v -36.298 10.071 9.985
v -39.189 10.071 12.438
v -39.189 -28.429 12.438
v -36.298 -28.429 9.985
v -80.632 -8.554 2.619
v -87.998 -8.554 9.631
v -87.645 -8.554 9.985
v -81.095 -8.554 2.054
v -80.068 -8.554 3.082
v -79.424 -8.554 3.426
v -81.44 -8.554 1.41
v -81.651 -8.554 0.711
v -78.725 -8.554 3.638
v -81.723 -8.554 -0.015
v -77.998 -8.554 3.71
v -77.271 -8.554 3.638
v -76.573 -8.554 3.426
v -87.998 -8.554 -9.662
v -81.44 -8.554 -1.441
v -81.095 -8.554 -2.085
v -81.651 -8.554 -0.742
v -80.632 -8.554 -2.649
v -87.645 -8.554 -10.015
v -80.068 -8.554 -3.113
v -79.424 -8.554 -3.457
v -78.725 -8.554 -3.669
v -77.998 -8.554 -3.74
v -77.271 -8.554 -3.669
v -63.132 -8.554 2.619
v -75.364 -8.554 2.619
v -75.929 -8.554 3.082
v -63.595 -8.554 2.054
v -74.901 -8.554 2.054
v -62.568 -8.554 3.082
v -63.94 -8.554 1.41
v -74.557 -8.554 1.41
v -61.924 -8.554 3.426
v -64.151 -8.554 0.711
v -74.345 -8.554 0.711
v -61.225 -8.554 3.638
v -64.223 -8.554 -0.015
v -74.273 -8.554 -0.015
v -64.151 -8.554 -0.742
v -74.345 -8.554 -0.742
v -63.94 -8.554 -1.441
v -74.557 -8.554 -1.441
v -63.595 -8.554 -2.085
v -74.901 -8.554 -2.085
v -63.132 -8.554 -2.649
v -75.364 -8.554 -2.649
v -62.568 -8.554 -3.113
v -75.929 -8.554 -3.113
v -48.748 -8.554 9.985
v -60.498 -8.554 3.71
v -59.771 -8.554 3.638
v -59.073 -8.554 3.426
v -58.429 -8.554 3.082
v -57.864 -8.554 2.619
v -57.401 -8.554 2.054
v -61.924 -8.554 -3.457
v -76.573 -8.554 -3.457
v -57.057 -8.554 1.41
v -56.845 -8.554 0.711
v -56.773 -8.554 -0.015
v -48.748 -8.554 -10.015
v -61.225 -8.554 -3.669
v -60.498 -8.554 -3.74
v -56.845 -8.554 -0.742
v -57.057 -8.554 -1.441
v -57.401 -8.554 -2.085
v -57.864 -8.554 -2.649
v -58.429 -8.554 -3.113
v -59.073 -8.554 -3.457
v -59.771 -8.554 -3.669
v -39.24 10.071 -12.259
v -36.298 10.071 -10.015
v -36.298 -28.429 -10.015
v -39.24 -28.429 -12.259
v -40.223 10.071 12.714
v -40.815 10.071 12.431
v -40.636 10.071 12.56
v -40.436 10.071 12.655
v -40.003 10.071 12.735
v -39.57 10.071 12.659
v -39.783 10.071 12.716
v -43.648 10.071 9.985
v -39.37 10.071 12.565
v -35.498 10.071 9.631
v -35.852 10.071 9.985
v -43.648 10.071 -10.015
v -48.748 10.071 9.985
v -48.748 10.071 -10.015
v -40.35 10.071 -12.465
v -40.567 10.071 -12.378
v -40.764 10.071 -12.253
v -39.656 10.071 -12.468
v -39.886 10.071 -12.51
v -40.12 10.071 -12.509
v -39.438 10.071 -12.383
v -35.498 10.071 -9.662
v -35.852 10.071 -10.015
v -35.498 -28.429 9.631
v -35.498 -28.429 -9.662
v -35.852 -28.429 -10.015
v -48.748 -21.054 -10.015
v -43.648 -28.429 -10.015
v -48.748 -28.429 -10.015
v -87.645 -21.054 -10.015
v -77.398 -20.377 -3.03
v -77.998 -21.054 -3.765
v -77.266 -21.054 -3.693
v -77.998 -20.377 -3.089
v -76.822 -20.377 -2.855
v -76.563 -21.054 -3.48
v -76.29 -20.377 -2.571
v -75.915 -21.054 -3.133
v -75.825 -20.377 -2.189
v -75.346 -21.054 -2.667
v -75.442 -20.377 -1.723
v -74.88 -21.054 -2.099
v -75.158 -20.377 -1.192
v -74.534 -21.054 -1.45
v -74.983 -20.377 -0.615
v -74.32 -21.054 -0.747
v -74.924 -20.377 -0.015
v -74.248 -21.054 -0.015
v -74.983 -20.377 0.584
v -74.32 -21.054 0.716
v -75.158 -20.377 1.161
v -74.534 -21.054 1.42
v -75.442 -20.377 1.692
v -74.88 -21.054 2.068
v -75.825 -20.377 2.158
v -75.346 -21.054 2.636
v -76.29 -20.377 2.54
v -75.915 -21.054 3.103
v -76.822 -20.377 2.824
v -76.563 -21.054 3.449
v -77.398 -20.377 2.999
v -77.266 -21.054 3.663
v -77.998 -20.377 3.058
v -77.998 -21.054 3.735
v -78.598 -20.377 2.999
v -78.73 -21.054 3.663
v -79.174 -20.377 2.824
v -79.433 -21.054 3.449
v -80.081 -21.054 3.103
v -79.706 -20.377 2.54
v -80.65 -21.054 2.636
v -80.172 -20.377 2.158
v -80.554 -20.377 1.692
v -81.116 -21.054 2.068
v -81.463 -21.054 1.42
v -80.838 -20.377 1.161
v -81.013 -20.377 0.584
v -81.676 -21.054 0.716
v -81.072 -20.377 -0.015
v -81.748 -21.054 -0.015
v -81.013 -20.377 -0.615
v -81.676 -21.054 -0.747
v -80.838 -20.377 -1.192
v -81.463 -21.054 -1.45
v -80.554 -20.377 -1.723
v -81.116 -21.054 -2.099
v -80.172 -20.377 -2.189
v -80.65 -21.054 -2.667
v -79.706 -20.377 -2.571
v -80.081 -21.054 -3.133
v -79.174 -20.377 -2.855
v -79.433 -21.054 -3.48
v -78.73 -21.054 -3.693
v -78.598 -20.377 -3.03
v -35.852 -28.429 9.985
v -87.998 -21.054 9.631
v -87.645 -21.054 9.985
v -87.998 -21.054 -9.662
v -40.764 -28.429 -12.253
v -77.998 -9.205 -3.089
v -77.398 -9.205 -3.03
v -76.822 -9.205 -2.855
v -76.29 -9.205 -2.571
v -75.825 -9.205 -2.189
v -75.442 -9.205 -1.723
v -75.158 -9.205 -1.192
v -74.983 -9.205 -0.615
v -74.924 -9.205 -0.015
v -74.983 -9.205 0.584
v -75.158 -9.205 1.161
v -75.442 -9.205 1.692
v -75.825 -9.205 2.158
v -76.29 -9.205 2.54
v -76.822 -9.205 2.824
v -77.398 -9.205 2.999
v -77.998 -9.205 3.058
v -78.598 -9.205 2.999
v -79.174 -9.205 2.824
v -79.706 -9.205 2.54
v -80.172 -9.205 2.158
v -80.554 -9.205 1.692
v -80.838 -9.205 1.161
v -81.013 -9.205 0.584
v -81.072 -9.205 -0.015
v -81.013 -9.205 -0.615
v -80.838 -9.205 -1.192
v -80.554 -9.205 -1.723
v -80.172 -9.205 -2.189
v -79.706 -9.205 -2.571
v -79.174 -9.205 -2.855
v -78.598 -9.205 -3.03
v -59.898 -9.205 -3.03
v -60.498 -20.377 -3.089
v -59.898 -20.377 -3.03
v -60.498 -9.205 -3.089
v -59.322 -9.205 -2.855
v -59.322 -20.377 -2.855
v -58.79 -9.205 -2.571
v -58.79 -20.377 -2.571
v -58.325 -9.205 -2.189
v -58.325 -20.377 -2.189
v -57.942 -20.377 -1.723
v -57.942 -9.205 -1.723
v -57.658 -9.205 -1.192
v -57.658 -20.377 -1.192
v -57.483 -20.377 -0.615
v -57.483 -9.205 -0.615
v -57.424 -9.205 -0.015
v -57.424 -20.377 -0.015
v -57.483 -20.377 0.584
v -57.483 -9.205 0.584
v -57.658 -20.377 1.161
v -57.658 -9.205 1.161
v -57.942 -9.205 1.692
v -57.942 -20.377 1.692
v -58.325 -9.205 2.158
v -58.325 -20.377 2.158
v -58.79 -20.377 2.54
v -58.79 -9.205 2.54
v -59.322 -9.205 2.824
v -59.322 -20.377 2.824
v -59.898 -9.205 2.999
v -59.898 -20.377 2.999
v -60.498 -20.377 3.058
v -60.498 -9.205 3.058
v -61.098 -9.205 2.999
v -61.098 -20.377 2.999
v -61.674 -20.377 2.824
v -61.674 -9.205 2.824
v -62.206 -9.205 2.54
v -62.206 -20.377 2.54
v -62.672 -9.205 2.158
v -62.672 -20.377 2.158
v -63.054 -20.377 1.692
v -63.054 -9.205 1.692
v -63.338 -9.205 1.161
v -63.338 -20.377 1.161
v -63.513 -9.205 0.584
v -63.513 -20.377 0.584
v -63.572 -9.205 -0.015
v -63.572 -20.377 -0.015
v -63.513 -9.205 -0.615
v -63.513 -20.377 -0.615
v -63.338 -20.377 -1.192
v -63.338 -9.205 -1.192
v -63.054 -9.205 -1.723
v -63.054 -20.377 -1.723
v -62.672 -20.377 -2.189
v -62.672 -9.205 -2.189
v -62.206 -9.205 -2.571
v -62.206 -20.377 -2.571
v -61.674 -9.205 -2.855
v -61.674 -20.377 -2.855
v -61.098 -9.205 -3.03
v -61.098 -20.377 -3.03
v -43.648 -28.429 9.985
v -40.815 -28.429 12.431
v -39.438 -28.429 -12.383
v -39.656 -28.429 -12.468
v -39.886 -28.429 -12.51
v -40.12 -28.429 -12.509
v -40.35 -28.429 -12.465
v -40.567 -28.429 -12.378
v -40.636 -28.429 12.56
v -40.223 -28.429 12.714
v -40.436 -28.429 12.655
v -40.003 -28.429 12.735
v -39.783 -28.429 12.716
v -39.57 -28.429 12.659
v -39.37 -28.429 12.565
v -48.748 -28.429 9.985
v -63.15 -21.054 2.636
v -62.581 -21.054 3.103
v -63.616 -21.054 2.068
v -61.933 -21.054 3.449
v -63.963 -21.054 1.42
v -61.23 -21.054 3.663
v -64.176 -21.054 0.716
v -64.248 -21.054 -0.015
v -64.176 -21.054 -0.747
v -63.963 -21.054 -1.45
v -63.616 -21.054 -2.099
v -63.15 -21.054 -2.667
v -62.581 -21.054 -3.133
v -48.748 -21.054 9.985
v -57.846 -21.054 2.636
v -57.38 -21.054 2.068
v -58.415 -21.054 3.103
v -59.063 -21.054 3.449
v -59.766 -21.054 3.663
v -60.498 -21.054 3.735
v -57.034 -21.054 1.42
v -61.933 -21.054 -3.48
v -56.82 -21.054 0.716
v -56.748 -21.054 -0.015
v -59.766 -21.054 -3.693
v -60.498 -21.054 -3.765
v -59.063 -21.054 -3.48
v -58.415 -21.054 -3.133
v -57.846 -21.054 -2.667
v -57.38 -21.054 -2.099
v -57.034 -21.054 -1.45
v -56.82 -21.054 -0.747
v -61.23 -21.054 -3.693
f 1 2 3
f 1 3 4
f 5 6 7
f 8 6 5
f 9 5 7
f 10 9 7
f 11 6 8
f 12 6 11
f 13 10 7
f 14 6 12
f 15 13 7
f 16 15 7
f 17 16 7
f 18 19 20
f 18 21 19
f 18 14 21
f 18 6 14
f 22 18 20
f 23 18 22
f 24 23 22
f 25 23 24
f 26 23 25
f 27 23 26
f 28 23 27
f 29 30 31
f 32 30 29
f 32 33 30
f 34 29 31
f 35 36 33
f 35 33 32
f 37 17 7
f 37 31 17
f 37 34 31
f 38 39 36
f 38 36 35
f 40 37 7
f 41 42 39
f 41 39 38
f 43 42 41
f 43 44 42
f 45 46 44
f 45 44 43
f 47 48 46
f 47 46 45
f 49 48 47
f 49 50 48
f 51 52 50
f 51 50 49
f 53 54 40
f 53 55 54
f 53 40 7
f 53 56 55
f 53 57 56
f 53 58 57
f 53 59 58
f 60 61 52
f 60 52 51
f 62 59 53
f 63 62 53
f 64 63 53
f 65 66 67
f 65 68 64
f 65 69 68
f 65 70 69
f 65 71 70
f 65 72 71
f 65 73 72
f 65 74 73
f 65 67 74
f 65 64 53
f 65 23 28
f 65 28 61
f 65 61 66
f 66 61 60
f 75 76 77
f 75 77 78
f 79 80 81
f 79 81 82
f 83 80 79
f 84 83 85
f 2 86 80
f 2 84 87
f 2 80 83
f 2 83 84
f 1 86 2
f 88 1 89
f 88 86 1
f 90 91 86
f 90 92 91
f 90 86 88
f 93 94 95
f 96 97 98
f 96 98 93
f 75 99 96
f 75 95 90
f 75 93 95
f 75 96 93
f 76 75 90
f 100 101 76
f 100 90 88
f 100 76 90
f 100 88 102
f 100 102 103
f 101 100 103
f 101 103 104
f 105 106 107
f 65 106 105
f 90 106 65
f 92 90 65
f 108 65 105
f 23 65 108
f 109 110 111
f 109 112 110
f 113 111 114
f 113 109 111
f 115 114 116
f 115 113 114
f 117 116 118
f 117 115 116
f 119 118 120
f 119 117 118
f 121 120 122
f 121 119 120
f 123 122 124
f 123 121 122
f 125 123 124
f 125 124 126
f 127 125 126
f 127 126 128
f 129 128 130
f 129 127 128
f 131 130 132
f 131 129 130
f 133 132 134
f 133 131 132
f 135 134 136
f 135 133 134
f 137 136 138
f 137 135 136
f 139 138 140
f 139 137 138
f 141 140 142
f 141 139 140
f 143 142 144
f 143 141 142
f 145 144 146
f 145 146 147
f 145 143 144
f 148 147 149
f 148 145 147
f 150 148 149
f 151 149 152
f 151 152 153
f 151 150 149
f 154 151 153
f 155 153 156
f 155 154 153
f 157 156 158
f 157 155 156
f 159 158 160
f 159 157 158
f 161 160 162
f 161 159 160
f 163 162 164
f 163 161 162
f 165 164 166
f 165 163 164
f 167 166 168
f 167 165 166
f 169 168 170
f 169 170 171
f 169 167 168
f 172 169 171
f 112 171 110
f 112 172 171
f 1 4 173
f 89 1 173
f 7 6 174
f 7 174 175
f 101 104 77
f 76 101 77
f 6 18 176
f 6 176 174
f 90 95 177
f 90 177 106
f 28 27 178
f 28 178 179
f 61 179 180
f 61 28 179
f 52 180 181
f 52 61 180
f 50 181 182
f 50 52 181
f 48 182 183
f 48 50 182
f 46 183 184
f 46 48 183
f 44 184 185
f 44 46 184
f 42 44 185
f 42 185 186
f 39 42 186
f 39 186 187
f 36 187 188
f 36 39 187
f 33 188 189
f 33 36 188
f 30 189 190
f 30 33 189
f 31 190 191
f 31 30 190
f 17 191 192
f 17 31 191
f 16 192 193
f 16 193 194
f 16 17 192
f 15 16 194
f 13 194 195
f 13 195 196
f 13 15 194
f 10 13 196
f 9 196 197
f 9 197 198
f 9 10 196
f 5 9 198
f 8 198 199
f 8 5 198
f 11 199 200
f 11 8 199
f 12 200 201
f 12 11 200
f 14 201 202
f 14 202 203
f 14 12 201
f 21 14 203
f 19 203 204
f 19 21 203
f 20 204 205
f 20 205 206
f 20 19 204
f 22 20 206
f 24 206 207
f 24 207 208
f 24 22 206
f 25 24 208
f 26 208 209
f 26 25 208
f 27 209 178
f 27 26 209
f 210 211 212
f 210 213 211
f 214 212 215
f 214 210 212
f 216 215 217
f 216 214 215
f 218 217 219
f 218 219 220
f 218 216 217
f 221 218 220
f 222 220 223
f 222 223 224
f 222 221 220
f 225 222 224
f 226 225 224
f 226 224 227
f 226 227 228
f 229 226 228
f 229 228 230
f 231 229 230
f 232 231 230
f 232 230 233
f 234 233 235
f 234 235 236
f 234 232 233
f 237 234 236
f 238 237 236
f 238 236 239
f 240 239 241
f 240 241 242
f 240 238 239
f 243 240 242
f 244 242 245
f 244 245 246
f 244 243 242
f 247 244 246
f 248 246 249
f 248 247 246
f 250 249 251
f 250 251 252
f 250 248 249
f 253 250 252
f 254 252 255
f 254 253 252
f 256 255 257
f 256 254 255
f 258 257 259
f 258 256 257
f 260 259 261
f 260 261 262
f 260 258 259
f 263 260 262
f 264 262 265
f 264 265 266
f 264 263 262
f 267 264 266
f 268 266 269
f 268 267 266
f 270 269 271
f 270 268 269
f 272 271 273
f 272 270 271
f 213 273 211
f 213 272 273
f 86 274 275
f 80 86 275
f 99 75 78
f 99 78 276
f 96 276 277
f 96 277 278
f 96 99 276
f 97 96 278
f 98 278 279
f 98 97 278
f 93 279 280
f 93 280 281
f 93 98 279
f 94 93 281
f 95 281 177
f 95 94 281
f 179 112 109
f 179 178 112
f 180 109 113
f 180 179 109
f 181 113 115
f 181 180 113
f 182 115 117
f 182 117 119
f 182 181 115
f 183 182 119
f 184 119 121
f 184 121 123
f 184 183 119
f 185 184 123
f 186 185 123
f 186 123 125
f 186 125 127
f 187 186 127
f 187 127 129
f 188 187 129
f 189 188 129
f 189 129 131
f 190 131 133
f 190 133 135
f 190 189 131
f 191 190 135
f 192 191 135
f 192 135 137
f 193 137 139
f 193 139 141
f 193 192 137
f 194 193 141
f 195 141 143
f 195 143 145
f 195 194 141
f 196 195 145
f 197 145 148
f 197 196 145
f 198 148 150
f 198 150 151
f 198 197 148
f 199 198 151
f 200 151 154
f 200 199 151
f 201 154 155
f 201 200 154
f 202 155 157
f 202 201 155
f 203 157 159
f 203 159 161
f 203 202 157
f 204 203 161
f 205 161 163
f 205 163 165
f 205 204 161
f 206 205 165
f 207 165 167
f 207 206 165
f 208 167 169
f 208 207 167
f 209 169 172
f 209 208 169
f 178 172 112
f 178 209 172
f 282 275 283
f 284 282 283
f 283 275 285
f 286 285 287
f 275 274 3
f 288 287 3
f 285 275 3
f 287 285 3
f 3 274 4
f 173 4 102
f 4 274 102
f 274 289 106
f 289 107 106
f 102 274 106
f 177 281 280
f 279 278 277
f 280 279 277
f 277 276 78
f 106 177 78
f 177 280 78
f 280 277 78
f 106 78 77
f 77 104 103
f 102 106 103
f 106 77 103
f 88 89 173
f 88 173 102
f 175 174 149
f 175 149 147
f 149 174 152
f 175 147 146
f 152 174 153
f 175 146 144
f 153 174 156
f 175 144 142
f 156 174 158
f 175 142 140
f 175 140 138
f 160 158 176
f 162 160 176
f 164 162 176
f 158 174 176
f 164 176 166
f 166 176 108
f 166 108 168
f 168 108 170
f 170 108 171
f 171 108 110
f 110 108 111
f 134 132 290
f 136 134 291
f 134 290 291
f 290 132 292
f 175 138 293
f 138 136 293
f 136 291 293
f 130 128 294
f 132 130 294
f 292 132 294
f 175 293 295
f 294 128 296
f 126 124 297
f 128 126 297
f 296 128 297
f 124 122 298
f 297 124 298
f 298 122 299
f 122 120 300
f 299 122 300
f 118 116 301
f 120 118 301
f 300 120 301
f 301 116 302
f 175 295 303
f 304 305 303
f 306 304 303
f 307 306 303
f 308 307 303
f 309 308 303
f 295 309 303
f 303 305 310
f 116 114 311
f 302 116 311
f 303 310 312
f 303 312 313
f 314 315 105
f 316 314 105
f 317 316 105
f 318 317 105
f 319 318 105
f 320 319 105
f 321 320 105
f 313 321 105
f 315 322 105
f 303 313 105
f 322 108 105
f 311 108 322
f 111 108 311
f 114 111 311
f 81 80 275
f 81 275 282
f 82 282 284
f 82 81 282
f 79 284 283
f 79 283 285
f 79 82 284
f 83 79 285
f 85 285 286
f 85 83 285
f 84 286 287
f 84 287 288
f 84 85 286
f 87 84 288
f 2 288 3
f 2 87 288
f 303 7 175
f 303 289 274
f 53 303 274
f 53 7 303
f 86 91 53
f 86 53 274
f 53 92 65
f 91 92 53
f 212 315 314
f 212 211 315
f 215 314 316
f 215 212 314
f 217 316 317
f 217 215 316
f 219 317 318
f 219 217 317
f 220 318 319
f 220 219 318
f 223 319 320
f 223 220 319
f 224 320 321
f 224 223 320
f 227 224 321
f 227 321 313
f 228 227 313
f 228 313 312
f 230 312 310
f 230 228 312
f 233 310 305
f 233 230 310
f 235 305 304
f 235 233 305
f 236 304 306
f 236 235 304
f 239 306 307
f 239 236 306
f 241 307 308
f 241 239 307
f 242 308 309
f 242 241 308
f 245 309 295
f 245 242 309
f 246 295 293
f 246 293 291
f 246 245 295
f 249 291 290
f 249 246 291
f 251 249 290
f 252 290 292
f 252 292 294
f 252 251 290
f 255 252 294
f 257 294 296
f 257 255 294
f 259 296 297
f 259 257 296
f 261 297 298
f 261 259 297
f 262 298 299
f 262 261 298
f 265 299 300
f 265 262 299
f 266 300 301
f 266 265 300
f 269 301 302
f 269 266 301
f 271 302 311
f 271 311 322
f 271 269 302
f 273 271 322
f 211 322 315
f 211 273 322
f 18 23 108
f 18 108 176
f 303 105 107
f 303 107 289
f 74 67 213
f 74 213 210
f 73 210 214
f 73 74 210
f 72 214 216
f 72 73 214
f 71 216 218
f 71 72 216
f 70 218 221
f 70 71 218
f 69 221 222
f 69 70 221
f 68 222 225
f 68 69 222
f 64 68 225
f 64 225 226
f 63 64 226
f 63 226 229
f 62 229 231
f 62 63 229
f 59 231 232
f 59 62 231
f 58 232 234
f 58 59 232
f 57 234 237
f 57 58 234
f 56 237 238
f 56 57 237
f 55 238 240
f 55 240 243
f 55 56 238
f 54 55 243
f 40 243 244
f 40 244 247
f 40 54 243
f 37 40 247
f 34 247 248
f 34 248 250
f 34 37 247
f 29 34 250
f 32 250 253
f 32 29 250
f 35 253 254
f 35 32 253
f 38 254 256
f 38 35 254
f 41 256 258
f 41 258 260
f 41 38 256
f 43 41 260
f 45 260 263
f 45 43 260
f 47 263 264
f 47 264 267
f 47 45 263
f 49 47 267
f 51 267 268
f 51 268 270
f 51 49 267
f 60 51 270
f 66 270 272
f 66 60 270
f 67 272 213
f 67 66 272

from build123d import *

# Parameters (mm, degrees)
BOSS_EXTRUDE1_DEPTH = 15.4
BOSS_EXTRUDE2_DEPTH = 5
SCALE_1_SCALE       = 2.5


with BuildPart() as part:
    # Sketch1 → Boss-Extrude1 (new body)
    with BuildSketch(Plane(origin=(0, -3, 0), x_dir=(1, 0, 0), z_dir=(0, 1, 0))):
        with BuildLine():
            Line((-51.8, -4), (-49.76, -4))
            Line((-49.76, -4), (-48.626761605, -4.978453238))
            ThreePointArc((-48.626761605, -4.978453238), (-48.302157504, -5.099995345), (-47.97651659, -4.981259077))
            Line((-47.97651659, -4.981259077), (-46.82, -4))
            Line((-46.82, -4), (-46.641421356, -4))
            Line((-46.641421356, -4), (-46.5, -3.858578644))
            Line((-46.5, -3.858578644), (-46.5, 3.858578644))
            Line((-46.5, 3.858578644), (-46.641421356, 4))
            Line((-46.641421356, 4), (-46.82, 4))
            Line((-46.82, 4), (-47.996771021, 4.897557777))
            ThreePointArc((-47.996771021, 4.897557777), (-48.302073982, 4.999995699), (-48.606516627, 4.895028552))
            Line((-48.606516627, 4.895028552), (-49.76, 4))
            Line((-49.76, 4), (-51.8, 4))
            Line((-51.8, 4), (-51.8, -4))
        make_face()
    extrude(amount=-BOSS_EXTRUDE1_DEPTH)

    # Sketch2 → Boss-Extrude2 (add)
    with BuildSketch(Plane(origin=(0, -10.45, 0), x_dir=(1, 0, 0), z_dir=(0, 1, 0))):
        Polygon((-67.5, 3.858578644), (-67.5, -3.858578644), (-67.358578644, -4), (-51.8, -4), (-51.8, 4), (-67.358578644, 4), align=None)
    extrude(amount=-BOSS_EXTRUDE2_DEPTH)

    # Sketch3 → Cut-Revolve1 (revolve, cut)
    with BuildSketch(Plane.XY):
        Polygon((-63.5, -15.45), (-65, -15.45), (-64.7295, -15.1795), (-64.7295, -10.7105), (-65, -10.44), (-63.5, -10.44), align=None)
    revolve(axis=Axis((-63.5, -10.44, 0), (0, -1, 0)), mode=Mode.SUBTRACT)

    # Sketch4 → Cut-Revolve2 (revolve, cut)
    with BuildSketch(Plane.XY):
        Polygon((-56.5, -15.45), (-58, -15.45), (-57.7295, -15.1795), (-57.7295, -10.7105), (-58, -10.44), (-56.5, -10.44), align=None)
    revolve(axis=Axis((-56.5, -10.44, 0), (0, -1, 0)), mode=Mode.SUBTRACT)


with BuildPart() as part_1:
    # 缩放比例1: scaled about (-53.834630524, -11.714177537, 0.010190259)
    add(part.part.scale(SCALE_1_SCALE).moved(Location((80.751945786, 17.571266306, -0.015285389))))


solid = part_1.part
